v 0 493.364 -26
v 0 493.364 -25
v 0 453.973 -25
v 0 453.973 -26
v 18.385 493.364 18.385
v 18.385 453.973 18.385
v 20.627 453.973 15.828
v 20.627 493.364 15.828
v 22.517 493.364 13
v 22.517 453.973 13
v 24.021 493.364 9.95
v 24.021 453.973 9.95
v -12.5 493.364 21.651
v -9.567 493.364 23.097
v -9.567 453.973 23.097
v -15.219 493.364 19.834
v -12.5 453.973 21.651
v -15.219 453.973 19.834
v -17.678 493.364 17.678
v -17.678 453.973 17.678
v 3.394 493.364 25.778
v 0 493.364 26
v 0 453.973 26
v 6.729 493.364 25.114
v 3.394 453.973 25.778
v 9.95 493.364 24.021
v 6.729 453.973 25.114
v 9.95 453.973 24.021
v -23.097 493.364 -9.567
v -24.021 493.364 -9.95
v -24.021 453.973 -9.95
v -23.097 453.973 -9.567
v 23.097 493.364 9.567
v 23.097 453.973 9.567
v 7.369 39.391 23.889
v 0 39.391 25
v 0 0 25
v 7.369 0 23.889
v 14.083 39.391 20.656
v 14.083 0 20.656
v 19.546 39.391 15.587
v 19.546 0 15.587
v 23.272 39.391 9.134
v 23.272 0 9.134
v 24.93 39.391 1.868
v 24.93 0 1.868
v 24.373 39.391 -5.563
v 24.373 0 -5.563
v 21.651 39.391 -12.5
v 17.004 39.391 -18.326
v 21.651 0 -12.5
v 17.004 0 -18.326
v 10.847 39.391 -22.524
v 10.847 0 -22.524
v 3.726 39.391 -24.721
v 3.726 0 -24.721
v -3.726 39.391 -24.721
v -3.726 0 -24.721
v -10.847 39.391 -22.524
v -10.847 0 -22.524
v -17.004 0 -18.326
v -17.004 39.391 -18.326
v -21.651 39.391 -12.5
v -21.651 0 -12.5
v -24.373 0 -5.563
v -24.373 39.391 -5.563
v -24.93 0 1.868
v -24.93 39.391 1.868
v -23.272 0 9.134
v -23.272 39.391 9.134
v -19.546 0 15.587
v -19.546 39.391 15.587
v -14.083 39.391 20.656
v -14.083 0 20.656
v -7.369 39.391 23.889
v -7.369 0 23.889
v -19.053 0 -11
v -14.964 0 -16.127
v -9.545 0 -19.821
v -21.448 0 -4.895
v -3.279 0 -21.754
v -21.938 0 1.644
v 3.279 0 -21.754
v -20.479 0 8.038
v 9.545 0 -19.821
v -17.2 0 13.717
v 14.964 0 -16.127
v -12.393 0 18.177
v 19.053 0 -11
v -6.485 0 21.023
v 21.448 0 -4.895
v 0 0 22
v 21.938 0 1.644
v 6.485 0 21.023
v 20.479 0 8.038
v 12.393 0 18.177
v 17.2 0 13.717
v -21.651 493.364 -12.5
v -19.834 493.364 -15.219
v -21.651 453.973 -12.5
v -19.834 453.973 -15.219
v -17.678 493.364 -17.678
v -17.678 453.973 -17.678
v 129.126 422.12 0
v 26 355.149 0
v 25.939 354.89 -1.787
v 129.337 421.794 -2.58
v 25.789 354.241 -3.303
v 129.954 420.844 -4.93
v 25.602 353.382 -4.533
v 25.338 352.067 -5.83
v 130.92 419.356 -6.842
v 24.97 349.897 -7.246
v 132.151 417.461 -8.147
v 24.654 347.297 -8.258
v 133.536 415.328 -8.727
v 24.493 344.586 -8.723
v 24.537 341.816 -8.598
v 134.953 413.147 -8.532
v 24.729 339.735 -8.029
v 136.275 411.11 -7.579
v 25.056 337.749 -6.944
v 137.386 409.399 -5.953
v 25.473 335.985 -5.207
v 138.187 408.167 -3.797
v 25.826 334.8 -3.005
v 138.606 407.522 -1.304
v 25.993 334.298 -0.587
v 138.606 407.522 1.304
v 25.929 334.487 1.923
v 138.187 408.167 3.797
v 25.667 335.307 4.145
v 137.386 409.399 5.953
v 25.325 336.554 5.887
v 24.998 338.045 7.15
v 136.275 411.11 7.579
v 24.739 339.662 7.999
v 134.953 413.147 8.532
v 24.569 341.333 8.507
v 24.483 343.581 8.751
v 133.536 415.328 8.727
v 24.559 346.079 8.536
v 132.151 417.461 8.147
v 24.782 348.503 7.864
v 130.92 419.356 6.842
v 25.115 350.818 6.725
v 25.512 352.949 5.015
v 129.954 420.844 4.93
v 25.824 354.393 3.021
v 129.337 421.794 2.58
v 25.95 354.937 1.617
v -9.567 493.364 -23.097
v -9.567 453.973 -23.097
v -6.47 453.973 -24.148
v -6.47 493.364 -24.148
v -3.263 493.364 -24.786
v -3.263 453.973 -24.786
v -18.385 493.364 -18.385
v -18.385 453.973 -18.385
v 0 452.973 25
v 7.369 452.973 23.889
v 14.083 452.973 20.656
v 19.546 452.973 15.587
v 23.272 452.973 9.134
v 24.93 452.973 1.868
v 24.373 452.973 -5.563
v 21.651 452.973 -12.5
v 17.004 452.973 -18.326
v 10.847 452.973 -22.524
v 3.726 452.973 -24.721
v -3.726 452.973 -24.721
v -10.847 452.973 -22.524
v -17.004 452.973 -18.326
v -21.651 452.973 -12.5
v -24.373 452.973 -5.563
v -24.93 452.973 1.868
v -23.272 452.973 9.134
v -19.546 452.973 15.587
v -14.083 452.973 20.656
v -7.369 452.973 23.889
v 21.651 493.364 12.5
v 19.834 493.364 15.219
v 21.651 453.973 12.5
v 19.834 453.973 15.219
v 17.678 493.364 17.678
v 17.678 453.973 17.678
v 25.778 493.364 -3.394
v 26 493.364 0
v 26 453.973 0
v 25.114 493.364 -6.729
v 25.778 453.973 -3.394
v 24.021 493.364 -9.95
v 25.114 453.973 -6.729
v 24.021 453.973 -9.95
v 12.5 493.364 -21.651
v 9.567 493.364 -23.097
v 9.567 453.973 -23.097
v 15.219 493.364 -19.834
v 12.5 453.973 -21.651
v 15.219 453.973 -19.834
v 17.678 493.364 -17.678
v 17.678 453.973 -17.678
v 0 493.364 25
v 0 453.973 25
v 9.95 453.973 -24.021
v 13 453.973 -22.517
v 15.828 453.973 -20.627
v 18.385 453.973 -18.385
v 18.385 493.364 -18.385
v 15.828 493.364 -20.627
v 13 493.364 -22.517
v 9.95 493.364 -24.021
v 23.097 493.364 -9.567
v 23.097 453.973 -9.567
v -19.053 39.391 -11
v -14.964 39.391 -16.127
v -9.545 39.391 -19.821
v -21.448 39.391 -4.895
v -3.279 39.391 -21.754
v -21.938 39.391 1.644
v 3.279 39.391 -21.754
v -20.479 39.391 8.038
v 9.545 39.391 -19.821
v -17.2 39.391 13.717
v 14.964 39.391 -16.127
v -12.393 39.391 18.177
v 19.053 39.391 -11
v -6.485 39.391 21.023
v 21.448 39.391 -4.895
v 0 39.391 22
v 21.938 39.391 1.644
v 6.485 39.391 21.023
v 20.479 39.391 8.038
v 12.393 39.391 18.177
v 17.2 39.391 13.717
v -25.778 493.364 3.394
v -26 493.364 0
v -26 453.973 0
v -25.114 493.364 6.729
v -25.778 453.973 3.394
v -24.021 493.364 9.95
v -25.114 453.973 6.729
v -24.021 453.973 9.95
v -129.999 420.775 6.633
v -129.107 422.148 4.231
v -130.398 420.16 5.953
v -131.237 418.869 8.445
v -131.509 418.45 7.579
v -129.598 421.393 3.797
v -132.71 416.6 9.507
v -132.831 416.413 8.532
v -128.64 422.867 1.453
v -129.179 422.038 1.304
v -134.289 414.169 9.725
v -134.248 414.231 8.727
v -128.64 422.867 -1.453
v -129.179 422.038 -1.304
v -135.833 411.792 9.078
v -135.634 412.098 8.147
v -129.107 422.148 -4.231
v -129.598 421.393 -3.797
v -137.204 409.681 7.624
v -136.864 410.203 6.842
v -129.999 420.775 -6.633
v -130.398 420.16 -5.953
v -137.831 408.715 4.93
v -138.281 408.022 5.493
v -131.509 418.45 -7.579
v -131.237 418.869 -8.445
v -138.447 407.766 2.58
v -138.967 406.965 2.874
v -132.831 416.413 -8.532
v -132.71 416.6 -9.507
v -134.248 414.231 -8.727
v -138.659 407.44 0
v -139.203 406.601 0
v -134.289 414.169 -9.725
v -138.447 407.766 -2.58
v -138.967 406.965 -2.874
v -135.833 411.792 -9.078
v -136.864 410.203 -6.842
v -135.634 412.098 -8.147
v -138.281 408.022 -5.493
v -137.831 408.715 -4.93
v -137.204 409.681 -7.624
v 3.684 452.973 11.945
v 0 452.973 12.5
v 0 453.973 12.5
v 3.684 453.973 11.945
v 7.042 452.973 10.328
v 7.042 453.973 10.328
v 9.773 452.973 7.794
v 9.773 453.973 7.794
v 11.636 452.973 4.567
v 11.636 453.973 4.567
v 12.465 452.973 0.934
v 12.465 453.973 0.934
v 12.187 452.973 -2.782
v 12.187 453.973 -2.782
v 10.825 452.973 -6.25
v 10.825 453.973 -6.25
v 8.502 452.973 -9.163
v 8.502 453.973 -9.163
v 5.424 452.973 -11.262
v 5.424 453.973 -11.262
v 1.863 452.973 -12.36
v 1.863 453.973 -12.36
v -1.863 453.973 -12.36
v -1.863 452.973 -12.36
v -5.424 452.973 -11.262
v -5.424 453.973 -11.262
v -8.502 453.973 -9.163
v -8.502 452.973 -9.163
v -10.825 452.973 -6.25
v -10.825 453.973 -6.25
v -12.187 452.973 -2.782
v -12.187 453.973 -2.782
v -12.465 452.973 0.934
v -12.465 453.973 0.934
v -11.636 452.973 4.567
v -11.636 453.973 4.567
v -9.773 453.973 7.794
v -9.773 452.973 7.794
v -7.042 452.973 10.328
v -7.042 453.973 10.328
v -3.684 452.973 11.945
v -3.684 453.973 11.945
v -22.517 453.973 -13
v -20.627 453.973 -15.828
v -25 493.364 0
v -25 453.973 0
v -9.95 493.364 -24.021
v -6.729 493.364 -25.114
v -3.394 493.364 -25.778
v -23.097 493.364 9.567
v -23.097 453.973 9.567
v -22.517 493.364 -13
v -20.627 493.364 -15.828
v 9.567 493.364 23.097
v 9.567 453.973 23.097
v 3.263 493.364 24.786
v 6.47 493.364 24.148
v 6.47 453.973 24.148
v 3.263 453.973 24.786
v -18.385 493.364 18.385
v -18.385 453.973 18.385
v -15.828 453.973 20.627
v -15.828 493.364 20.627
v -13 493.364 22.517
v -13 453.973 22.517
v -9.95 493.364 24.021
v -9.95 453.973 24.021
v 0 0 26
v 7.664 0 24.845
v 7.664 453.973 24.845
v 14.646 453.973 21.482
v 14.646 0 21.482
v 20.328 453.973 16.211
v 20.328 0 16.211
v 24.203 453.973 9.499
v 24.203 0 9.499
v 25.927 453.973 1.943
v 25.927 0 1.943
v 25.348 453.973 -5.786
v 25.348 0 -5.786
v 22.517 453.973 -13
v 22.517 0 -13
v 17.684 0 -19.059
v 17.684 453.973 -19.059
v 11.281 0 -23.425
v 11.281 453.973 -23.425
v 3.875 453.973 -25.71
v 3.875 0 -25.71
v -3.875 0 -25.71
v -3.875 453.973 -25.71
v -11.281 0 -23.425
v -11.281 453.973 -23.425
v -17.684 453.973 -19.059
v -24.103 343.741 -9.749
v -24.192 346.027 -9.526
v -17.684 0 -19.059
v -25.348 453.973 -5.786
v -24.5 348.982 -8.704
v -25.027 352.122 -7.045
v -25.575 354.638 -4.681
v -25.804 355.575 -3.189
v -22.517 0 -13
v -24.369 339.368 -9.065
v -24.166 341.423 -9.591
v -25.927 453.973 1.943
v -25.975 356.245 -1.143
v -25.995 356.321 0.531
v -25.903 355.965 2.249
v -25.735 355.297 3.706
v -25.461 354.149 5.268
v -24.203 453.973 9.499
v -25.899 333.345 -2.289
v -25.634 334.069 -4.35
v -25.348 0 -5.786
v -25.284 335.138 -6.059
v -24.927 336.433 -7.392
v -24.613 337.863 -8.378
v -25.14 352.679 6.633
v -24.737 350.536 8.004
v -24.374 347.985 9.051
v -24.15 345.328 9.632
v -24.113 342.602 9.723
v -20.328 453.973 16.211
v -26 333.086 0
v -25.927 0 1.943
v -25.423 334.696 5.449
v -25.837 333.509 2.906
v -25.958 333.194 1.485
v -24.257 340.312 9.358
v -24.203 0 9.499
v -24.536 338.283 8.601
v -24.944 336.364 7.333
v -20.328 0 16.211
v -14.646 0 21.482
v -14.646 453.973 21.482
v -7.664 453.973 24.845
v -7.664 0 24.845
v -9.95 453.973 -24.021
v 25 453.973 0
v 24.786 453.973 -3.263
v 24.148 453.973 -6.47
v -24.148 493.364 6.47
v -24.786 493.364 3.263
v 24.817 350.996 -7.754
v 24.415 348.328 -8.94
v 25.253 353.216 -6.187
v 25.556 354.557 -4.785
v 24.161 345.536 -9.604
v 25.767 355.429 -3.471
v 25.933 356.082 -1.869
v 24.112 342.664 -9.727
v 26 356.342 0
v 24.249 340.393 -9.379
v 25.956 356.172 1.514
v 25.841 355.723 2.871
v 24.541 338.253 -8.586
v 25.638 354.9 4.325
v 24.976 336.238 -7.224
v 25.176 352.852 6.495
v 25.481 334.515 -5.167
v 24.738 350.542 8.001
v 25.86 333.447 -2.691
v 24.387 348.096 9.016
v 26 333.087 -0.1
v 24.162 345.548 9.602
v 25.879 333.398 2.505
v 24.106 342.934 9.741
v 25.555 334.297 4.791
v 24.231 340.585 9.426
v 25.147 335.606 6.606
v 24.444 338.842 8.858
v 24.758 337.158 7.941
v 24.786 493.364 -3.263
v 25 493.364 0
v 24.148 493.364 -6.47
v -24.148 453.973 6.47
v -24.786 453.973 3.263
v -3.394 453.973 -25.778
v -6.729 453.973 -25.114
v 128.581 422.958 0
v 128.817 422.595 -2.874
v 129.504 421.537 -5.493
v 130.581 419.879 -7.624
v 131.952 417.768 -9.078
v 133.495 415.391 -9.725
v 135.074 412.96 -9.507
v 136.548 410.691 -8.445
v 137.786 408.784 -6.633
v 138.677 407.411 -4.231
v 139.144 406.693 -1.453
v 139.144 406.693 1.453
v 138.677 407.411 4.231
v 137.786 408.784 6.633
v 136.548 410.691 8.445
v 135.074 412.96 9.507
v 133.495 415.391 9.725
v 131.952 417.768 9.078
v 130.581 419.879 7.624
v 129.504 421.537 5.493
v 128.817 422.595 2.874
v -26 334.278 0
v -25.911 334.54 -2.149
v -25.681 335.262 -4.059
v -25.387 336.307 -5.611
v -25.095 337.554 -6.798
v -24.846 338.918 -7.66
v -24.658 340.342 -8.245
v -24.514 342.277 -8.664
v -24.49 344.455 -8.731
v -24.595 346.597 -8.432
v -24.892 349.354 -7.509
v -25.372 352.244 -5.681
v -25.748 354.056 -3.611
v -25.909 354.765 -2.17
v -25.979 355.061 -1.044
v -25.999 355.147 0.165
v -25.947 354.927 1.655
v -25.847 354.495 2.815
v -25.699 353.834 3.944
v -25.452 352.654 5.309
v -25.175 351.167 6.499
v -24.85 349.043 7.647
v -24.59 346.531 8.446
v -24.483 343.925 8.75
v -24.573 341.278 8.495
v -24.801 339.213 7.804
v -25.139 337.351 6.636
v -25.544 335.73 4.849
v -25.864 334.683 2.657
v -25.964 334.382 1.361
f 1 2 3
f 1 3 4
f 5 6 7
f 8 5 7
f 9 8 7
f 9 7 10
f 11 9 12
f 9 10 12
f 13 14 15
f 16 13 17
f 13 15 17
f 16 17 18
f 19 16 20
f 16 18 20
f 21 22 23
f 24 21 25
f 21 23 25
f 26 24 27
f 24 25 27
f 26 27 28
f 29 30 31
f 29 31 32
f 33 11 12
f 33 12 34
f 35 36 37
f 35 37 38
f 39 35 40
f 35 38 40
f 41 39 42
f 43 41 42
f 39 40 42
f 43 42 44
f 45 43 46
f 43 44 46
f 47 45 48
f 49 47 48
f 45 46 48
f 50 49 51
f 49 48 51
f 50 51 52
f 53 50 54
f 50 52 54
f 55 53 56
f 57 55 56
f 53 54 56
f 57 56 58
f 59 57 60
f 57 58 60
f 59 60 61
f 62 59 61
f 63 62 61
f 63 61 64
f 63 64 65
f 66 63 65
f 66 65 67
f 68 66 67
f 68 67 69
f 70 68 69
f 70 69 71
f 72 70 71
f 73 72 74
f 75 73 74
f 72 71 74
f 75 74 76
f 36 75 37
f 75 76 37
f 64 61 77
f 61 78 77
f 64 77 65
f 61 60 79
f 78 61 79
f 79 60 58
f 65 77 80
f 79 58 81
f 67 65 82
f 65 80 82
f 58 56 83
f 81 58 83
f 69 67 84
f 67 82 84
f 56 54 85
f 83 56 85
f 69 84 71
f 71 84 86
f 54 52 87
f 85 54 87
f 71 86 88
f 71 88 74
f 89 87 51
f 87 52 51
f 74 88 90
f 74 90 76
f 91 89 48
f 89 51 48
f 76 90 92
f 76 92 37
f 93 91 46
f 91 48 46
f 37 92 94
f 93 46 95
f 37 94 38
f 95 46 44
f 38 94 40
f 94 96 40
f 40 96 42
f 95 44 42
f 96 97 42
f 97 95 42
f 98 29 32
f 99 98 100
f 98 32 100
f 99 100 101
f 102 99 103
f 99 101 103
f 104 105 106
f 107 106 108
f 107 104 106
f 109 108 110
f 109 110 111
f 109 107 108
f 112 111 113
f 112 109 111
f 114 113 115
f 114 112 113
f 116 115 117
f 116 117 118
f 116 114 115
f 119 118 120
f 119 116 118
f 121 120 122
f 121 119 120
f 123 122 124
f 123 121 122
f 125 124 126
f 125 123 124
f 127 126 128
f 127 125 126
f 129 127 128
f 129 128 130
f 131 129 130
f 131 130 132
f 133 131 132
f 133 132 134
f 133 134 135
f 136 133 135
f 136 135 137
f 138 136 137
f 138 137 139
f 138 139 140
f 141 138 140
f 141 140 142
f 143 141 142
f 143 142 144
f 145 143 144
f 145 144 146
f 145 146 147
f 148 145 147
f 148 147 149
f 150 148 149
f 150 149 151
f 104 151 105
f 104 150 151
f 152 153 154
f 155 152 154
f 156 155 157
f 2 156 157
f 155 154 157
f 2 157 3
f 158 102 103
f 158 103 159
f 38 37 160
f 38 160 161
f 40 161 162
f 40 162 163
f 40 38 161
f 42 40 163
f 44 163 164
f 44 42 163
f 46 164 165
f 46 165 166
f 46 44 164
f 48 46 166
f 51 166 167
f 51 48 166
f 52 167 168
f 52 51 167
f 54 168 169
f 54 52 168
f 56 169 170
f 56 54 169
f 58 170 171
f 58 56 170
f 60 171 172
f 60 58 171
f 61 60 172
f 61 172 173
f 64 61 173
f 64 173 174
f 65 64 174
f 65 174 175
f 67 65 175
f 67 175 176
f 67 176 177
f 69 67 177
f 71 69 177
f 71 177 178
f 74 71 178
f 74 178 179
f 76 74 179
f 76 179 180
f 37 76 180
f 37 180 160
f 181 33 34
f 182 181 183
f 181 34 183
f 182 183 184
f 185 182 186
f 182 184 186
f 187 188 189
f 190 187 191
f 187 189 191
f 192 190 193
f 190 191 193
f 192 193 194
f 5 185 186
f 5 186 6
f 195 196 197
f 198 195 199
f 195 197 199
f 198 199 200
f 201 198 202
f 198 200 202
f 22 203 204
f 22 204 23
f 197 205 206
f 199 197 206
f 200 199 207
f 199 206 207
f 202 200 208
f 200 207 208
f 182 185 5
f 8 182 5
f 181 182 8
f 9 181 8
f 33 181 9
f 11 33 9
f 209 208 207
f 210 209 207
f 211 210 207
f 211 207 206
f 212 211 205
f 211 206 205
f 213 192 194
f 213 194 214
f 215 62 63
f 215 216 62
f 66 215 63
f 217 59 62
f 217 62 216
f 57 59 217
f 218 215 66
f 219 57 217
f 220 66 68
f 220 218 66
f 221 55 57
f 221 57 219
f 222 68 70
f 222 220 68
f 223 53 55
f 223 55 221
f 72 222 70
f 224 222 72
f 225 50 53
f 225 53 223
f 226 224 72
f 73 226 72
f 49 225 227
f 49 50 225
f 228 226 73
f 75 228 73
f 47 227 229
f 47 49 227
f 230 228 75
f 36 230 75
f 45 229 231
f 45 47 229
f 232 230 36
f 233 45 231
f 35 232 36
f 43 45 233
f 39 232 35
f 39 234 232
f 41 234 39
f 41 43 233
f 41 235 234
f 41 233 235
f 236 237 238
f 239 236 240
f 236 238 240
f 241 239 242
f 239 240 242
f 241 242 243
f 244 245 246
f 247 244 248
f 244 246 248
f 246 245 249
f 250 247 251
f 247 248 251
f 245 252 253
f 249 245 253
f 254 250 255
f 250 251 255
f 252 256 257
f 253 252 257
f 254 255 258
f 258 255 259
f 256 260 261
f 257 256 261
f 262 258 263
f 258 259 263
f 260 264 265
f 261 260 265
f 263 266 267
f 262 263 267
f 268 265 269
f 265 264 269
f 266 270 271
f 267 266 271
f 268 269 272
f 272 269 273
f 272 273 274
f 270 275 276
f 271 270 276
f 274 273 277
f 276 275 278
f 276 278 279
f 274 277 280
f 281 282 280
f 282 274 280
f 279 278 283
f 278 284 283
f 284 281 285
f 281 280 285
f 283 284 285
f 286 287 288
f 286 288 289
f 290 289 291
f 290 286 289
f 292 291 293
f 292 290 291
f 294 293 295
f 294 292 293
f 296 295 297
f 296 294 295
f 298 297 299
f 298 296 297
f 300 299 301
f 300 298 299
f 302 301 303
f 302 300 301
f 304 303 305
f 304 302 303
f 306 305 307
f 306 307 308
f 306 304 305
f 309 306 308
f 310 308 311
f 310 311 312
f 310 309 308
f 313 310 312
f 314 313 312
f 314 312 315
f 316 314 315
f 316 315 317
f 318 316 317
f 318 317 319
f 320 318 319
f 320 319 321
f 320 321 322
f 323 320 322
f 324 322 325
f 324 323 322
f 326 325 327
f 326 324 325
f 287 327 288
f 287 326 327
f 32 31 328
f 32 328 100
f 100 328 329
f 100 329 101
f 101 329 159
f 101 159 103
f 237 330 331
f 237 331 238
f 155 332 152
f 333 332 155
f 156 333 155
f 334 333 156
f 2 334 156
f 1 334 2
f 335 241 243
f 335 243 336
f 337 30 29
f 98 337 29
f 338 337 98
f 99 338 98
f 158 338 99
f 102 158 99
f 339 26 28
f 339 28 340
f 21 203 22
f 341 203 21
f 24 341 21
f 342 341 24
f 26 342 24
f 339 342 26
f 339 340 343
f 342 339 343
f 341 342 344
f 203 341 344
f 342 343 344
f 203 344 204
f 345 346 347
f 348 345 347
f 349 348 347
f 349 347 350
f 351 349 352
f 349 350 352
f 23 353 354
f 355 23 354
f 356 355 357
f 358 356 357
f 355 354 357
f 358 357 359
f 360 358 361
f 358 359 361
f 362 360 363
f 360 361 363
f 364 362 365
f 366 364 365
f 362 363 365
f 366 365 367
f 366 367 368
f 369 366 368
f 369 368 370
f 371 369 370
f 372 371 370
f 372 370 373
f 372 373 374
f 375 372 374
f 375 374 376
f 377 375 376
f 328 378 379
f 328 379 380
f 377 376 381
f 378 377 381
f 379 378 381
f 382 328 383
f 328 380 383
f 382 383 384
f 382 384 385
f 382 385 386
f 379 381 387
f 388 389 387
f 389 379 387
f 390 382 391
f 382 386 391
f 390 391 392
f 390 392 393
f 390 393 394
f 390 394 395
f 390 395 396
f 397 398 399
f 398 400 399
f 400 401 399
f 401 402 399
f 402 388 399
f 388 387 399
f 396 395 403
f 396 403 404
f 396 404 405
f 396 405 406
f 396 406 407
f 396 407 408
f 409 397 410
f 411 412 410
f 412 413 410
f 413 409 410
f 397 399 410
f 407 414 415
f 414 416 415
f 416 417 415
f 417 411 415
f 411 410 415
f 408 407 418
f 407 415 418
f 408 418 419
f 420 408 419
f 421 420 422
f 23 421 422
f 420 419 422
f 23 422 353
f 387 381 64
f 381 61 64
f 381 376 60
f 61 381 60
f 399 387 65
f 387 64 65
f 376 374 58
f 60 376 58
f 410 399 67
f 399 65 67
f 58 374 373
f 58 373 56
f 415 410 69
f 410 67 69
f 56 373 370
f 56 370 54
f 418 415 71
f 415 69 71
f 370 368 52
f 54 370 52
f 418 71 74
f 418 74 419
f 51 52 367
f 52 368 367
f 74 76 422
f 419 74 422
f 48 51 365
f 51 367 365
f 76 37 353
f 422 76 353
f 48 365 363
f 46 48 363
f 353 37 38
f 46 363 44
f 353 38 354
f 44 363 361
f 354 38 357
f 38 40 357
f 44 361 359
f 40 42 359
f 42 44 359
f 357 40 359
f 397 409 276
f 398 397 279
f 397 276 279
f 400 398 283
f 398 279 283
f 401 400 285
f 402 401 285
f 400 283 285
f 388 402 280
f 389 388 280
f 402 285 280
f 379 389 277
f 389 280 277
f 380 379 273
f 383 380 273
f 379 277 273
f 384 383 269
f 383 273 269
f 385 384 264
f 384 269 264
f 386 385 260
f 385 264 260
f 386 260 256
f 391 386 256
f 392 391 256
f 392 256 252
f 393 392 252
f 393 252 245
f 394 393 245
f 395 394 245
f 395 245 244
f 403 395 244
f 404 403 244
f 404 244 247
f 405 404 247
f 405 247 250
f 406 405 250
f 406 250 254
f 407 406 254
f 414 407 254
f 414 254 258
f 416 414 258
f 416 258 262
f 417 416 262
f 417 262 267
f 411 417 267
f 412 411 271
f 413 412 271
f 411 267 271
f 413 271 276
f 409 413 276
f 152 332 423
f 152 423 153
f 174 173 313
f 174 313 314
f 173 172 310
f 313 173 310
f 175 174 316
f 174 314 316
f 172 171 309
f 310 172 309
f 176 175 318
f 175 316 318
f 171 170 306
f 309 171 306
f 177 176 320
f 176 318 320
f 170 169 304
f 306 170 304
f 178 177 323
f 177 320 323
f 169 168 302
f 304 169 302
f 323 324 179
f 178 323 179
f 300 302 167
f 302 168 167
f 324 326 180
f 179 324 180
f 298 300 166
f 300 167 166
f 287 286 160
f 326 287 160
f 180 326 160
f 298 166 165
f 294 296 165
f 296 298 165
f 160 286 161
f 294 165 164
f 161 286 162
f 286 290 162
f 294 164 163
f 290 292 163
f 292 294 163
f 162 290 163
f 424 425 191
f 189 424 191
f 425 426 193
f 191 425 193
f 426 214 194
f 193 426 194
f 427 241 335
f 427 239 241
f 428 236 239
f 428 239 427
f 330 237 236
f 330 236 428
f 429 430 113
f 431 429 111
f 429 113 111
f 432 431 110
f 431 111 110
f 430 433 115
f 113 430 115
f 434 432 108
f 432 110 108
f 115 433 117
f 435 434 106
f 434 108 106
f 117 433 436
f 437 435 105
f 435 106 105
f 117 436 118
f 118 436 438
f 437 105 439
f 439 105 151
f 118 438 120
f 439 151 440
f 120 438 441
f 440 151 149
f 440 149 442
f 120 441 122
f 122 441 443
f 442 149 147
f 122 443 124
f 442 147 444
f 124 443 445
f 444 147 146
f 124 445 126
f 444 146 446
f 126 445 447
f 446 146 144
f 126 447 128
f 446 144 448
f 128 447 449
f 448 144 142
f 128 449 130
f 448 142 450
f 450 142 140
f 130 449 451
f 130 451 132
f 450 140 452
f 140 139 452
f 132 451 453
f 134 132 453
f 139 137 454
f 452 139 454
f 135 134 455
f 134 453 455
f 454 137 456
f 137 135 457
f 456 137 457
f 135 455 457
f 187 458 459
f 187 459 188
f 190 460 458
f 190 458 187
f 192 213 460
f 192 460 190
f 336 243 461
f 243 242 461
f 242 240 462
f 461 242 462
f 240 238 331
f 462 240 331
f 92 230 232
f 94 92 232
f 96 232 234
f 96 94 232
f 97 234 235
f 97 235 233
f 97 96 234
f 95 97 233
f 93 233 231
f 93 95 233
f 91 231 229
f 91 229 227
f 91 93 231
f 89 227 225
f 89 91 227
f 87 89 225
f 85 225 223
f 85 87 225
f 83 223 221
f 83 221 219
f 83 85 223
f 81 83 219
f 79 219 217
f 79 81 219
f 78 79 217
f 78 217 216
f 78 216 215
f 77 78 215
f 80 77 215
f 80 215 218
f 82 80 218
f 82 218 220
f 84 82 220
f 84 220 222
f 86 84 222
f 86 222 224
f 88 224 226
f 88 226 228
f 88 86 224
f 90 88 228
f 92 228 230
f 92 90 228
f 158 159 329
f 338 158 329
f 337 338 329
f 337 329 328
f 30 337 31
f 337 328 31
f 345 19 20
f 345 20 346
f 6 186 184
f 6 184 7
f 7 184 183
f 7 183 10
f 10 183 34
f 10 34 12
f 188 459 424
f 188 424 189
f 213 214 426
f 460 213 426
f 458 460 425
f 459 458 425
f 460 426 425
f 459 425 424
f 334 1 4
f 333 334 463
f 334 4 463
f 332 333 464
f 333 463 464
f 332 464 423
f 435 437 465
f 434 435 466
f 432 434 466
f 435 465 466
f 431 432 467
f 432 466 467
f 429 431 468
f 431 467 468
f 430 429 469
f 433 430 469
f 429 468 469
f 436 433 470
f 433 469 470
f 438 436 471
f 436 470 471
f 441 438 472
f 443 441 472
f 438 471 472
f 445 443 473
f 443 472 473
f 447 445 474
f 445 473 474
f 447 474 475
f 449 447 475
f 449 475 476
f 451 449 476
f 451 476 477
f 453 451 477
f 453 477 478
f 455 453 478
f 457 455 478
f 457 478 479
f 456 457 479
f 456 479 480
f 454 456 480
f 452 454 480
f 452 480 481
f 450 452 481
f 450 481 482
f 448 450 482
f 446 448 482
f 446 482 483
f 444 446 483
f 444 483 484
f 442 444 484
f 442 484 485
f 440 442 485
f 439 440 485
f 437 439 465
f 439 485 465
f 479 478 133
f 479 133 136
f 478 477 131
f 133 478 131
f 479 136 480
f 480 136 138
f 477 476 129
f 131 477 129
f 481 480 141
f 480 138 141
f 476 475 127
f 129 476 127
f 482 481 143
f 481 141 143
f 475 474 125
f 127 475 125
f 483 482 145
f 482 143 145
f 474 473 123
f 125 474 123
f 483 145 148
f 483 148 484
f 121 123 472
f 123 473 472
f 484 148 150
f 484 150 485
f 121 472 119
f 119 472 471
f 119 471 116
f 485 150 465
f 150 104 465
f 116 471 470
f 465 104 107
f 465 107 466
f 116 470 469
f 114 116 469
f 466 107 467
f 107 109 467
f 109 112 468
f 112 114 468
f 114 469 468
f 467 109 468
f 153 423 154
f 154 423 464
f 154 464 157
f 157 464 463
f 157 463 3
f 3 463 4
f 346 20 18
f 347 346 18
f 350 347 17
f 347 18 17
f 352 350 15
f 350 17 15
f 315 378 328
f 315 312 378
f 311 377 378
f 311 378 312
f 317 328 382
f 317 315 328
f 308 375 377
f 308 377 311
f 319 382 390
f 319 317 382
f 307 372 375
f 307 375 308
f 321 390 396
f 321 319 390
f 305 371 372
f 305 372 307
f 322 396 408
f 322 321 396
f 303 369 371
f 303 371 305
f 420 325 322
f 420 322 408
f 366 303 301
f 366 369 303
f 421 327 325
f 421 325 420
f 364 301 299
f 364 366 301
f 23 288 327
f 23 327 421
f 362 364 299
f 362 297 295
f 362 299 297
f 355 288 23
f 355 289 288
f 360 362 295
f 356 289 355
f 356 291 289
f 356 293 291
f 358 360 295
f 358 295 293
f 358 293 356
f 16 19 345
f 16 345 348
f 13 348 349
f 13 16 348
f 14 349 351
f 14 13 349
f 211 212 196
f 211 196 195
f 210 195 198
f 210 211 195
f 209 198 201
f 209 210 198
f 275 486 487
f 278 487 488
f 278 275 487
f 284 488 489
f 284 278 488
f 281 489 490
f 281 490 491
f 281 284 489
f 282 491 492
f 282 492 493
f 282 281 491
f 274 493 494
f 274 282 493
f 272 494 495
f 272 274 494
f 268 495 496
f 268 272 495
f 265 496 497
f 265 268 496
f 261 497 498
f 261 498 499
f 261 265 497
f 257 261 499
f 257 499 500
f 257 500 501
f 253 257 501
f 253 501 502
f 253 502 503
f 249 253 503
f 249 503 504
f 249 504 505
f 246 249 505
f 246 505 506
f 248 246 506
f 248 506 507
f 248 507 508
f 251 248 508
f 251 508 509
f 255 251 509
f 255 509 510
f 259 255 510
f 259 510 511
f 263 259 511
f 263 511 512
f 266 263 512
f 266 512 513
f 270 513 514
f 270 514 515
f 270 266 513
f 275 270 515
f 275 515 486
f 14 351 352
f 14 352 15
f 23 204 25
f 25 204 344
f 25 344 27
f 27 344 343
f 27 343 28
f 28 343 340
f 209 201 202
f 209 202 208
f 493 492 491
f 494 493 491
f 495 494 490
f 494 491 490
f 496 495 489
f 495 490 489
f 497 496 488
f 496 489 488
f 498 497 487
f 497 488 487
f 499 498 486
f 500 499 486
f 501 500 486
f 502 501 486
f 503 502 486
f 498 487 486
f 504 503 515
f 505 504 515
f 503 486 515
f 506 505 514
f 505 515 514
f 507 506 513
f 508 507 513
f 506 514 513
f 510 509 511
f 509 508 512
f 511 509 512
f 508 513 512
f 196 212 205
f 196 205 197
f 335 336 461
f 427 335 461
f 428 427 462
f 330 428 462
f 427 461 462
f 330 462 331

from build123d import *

# Parameters (mm, degrees)
CONNECTORPIECE_R           = 25
CONNECTORPIECE_R_2         = 22
VELCRO_CONNECTION_DEPTH    = 39.390903205
CONNECTORPIECE_6_R         = 26
CONNECTORPIECE_6_R_2       = 25
FABRIC_DEPTH               = 453.972644869
TOP_START                  = -1
SKETCH2_R                  = 25
SKETCH2_R_2                = 12.5
TOP_HOLE_DEPTH             = 1
ARM_1_EXTRUSION_REACH      = 413.497
ARM_1_EXTRUSION_END_RADIUS = 25
ARM_1_R                    = 9.751861444
ARM_1_R_2                  = 8.751861444
BOSS_EXTRUDE2_REACH        = 504.244
BOSS_EXTRUDE2_END_RADIUS   = 26
SKETCH4_R                  = 9.751861444
SKETCH4_R_2                = 8.751861444
BOSS_EXTRUDE4_DEPTH        = 39.390903205
BOSS_EXTRUDE4_2_DEPTH      = 39.390903205
BOSS_EXTRUDE4_3_DEPTH      = 39.390903205
BOSS_EXTRUDE4_4_DEPTH      = 39.390903205
BOSS_EXTRUDE4_5_DEPTH      = 39.390903205
BOSS_EXTRUDE4_6_DEPTH      = 39.390903205
BOSS_EXTRUDE4_7_DEPTH      = 39.390903205
BOSS_EXTRUDE4_8_DEPTH      = 39.390903205


with BuildPart() as part:
    # connectorpiece → velcro connection (new body)
    with BuildSketch(Plane(origin=(0, 0, 0), x_dir=(1, 0, 0), z_dir=(0, 1, 0))):
        Circle(CONNECTORPIECE_R)
        Circle(CONNECTORPIECE_R_2, mode=Mode.SUBTRACT)
    extrude(amount=VELCRO_CONNECTION_DEPTH)


with BuildPart() as body_2:
    # connectorpiece<6> → fabric (new body)
    with BuildSketch(Plane(origin=(0, 0, 0), x_dir=(1, 0, 0), z_dir=(0, 1, 0))):
        Circle(CONNECTORPIECE_6_R)
        Circle(CONNECTORPIECE_6_R_2, mode=Mode.SUBTRACT)
    extrude(amount=FABRIC_DEPTH)

    # Sketch2 → top hole (add)
    with BuildSketch(Plane(origin=(0, 453.972644869, 0), x_dir=(1, 0, 0), z_dir=(0, 1, 0)).offset(TOP_START)):
        Circle(SKETCH2_R)
        Circle(SKETCH2_R_2, mode=Mode.SUBTRACT)
    extrude(amount=TOP_HOLE_DEPTH)

    # arm 1 extrusion: up to this cylinder (the profile starts outside it)
    arm_1_extrusion_end = Plane(origin=(0, 414.77981, 0), z_dir=(0, -1, 0)) * Cylinder(ARM_1_EXTRUSION_END_RADIUS, 877.994, mode=Mode.PRIVATE)
    # arm 1 → arm 1 extrusion (add, up to the surface)
    with BuildSketch(Plane(origin=(-283.635608583, 184.195117915, 0), x_dir=(0, 0, -1), z_dir=(0.8386705679454215, -0.5446390350150312, 0)), mode=Mode.PRIVATE) as arm_1_extrusion_sk1:
        with Locations((0, 274.940723008)):
            Circle(ARM_1_R)
        with Locations((0, 274.940723008)):
            Circle(ARM_1_R_2, mode=Mode.SUBTRACT)
    arm_1_extrusion_tool1 = extrude(arm_1_extrusion_sk1.sketch, amount=ARM_1_EXTRUSION_REACH, mode=Mode.PRIVATE) - arm_1_extrusion_end
    add(arm_1_extrusion_tool1.solids().sort_by_distance((-133.892159, 414.77981, 9.476037))[0])


with BuildPart() as body_3:
    # Boss-Extrude2: up to this cylinder (the profile starts outside it)
    boss_extrude2_end = Plane(origin=(0, 414.77981, 0), z_dir=(0, -1, 0)) * Cylinder(BOSS_EXTRUDE2_END_RADIUS, 1061.488, mode=Mode.PRIVATE)
    # Sketch4 → Boss-Extrude2 (new, up to the surface)
    with BuildSketch(Plane(origin=(283.635608583, 184.195117915, 0), x_dir=(0, 0, 1), z_dir=(-0.8386705679454256, -0.5446390350150249, 0)), mode=Mode.PRIVATE) as boss_extrude2_sk1:
        with Locations((0, 274.940723008)):
            Circle(SKETCH4_R)
        with Locations((0, 274.940723008)):
            Circle(SKETCH4_R_2, mode=Mode.SUBTRACT)
    boss_extrude2_tool1 = extrude(boss_extrude2_sk1.sketch, amount=BOSS_EXTRUDE2_REACH, mode=Mode.PRIVATE) - boss_extrude2_end
    add(boss_extrude2_tool1.solids().sort_by_distance((133.892159, 414.77981, -9.476037))[0])


with BuildPart() as body_4:
    # Sketch5 → Boss-Extrude4 (new body)
    with BuildSketch(Plane(origin=(0, 453.972644869, 0), x_dir=(1, 0, 0), z_dir=(0, 1, 0))):
        with BuildLine():
            ThreePointArc((23.096988313, 9.567085809), (24.51963201, 4.87725805), (25, 0))
            Line((25, 0), (26, 0))
            ThreePointArc((26, 0), (25.50041729, 5.072348372), (24.020867845, 9.949769241))
            Line((24.020867845, 9.949769241), (23.096988313, 9.567085809))
        make_face()
    extrude(amount=BOSS_EXTRUDE4_DEPTH)


with BuildPart() as body_5:
    # Sketch5 → Boss-Extrude4 2 (new body)
    with BuildSketch(Plane(origin=(0, 453.972644869, 0), x_dir=(1, 0, 0), z_dir=(0, 1, 0))):
        with BuildLine():
            Line((24.020867845, -9.949769241), (23.096988313, -9.567085809))
            ThreePointArc((23.096988313, -9.567085809), (20.786740308, -13.889255825), (17.67766953, -17.67766953))
            Line((17.67766953, -17.67766953), (18.384776311, -18.384776311))
            ThreePointArc((18.384776311, -18.384776311), (21.61820992, -14.444826059), (24.020867845, -9.949769241))
        make_face()
    extrude(amount=BOSS_EXTRUDE4_2_DEPTH)


with BuildPart() as body_6:
    # Sketch5 → Boss-Extrude4 3 (new body)
    with BuildSketch(Plane(origin=(0, 453.972644869, 0), x_dir=(1, 0, 0), z_dir=(0, 1, 0))):
        with BuildLine():
            Line((9.949769241, -24.020867845), (9.567085809, -23.096988313))
            ThreePointArc((9.567085809, -23.096988313), (4.87725805, -24.51963201), (0, -25))
            Line((0, -25), (0, -26))
            ThreePointArc((0, -26), (5.072348372, -25.50041729), (9.949769241, -24.020867845))
        make_face()
    extrude(amount=BOSS_EXTRUDE4_3_DEPTH)


with BuildPart() as body_7:
    # Sketch5 → Boss-Extrude4 4 (new body)
    with BuildSketch(Plane(origin=(0, 453.972644869, 0), x_dir=(1, 0, 0), z_dir=(0, 1, 0))):
        with BuildLine():
            Line((-9.949769241, -24.020867845), (-9.567085809, -23.096988313))
            ThreePointArc((-9.567085809, -23.096988313), (-13.889255825, -20.786740308), (-17.67766953, -17.67766953))
            Line((-17.67766953, -17.67766953), (-18.384776311, -18.384776311))
            ThreePointArc((-18.384776311, -18.384776311), (-14.444826059, -21.61820992), (-9.949769241, -24.020867845))
        make_face()
    extrude(amount=BOSS_EXTRUDE4_4_DEPTH)


with BuildPart() as body_8:
    # Sketch5 → Boss-Extrude4 5 (new body)
    with BuildSketch(Plane(origin=(0, 453.972644869, 0), x_dir=(1, 0, 0), z_dir=(0, 1, 0))):
        with BuildLine():
            Line((-24.020867845, -9.949769241), (-23.096988313, -9.567085809))
            ThreePointArc((-23.096988313, -9.567085809), (-24.51963201, -4.87725805), (-25, 0))
            Line((-25, 0), (-26, 0))
            ThreePointArc((-26, 0), (-25.50041729, -5.072348372), (-24.020867845, -9.949769241))
        make_face()
    extrude(amount=BOSS_EXTRUDE4_5_DEPTH)


with BuildPart() as body_9:
    # Sketch5 → Boss-Extrude4 6 (new body)
    with BuildSketch(Plane(origin=(0, 453.972644869, 0), x_dir=(1, 0, 0), z_dir=(0, 1, 0))):
        with BuildLine():
            Line((-24.020867845, 9.949769241), (-23.096988313, 9.567085809))
            ThreePointArc((-23.096988313, 9.567085809), (-20.786740308, 13.889255825), (-17.67766953, 17.67766953))
            Line((-17.67766953, 17.67766953), (-18.384776311, 18.384776311))
            ThreePointArc((-18.384776311, 18.384776311), (-21.61820992, 14.444826059), (-24.020867845, 9.949769241))
        make_face()
    extrude(amount=BOSS_EXTRUDE4_6_DEPTH)


with BuildPart() as body_10:
    # Sketch5 → Boss-Extrude4 7 (new body)
    with BuildSketch(Plane(origin=(0, 453.972644869, 0), x_dir=(1, 0, 0), z_dir=(0, 1, 0))):
        with BuildLine():
            Line((-9.949769241, 24.020867845), (-9.567085809, 23.096988313))
            ThreePointArc((-9.567085809, 23.096988313), (-4.87725805, 24.51963201), (0, 25))
            Line((0, 25), (0, 26))
            ThreePointArc((0, 26), (-5.072348372, 25.50041729), (-9.949769241, 24.020867845))
        make_face()
    extrude(amount=BOSS_EXTRUDE4_7_DEPTH)


with BuildPart() as body_11:
    # Sketch5 → Boss-Extrude4 8 (new body)
    with BuildSketch(Plane(origin=(0, 453.972644869, 0), x_dir=(1, 0, 0), z_dir=(0, 1, 0))):
        with BuildLine():
            Line((9.949769241, 24.020867845), (9.567085809, 23.096988313))
            ThreePointArc((9.567085809, 23.096988313), (13.889255825, 20.786740308), (17.67766953, 17.67766953))
            Line((17.67766953, 17.67766953), (18.384776311, 18.384776311))
            ThreePointArc((18.384776311, 18.384776311), (14.444826059, 21.61820992), (9.949769241, 24.020867845))
        make_face()
    extrude(amount=BOSS_EXTRUDE4_8_DEPTH)


solid = Compound([part.part, body_2.part, body_3.part, body_4.part, body_5.part, body_6.part, body_7.part, body_8.part, body_9.part, body_10.part, body_11.part])
